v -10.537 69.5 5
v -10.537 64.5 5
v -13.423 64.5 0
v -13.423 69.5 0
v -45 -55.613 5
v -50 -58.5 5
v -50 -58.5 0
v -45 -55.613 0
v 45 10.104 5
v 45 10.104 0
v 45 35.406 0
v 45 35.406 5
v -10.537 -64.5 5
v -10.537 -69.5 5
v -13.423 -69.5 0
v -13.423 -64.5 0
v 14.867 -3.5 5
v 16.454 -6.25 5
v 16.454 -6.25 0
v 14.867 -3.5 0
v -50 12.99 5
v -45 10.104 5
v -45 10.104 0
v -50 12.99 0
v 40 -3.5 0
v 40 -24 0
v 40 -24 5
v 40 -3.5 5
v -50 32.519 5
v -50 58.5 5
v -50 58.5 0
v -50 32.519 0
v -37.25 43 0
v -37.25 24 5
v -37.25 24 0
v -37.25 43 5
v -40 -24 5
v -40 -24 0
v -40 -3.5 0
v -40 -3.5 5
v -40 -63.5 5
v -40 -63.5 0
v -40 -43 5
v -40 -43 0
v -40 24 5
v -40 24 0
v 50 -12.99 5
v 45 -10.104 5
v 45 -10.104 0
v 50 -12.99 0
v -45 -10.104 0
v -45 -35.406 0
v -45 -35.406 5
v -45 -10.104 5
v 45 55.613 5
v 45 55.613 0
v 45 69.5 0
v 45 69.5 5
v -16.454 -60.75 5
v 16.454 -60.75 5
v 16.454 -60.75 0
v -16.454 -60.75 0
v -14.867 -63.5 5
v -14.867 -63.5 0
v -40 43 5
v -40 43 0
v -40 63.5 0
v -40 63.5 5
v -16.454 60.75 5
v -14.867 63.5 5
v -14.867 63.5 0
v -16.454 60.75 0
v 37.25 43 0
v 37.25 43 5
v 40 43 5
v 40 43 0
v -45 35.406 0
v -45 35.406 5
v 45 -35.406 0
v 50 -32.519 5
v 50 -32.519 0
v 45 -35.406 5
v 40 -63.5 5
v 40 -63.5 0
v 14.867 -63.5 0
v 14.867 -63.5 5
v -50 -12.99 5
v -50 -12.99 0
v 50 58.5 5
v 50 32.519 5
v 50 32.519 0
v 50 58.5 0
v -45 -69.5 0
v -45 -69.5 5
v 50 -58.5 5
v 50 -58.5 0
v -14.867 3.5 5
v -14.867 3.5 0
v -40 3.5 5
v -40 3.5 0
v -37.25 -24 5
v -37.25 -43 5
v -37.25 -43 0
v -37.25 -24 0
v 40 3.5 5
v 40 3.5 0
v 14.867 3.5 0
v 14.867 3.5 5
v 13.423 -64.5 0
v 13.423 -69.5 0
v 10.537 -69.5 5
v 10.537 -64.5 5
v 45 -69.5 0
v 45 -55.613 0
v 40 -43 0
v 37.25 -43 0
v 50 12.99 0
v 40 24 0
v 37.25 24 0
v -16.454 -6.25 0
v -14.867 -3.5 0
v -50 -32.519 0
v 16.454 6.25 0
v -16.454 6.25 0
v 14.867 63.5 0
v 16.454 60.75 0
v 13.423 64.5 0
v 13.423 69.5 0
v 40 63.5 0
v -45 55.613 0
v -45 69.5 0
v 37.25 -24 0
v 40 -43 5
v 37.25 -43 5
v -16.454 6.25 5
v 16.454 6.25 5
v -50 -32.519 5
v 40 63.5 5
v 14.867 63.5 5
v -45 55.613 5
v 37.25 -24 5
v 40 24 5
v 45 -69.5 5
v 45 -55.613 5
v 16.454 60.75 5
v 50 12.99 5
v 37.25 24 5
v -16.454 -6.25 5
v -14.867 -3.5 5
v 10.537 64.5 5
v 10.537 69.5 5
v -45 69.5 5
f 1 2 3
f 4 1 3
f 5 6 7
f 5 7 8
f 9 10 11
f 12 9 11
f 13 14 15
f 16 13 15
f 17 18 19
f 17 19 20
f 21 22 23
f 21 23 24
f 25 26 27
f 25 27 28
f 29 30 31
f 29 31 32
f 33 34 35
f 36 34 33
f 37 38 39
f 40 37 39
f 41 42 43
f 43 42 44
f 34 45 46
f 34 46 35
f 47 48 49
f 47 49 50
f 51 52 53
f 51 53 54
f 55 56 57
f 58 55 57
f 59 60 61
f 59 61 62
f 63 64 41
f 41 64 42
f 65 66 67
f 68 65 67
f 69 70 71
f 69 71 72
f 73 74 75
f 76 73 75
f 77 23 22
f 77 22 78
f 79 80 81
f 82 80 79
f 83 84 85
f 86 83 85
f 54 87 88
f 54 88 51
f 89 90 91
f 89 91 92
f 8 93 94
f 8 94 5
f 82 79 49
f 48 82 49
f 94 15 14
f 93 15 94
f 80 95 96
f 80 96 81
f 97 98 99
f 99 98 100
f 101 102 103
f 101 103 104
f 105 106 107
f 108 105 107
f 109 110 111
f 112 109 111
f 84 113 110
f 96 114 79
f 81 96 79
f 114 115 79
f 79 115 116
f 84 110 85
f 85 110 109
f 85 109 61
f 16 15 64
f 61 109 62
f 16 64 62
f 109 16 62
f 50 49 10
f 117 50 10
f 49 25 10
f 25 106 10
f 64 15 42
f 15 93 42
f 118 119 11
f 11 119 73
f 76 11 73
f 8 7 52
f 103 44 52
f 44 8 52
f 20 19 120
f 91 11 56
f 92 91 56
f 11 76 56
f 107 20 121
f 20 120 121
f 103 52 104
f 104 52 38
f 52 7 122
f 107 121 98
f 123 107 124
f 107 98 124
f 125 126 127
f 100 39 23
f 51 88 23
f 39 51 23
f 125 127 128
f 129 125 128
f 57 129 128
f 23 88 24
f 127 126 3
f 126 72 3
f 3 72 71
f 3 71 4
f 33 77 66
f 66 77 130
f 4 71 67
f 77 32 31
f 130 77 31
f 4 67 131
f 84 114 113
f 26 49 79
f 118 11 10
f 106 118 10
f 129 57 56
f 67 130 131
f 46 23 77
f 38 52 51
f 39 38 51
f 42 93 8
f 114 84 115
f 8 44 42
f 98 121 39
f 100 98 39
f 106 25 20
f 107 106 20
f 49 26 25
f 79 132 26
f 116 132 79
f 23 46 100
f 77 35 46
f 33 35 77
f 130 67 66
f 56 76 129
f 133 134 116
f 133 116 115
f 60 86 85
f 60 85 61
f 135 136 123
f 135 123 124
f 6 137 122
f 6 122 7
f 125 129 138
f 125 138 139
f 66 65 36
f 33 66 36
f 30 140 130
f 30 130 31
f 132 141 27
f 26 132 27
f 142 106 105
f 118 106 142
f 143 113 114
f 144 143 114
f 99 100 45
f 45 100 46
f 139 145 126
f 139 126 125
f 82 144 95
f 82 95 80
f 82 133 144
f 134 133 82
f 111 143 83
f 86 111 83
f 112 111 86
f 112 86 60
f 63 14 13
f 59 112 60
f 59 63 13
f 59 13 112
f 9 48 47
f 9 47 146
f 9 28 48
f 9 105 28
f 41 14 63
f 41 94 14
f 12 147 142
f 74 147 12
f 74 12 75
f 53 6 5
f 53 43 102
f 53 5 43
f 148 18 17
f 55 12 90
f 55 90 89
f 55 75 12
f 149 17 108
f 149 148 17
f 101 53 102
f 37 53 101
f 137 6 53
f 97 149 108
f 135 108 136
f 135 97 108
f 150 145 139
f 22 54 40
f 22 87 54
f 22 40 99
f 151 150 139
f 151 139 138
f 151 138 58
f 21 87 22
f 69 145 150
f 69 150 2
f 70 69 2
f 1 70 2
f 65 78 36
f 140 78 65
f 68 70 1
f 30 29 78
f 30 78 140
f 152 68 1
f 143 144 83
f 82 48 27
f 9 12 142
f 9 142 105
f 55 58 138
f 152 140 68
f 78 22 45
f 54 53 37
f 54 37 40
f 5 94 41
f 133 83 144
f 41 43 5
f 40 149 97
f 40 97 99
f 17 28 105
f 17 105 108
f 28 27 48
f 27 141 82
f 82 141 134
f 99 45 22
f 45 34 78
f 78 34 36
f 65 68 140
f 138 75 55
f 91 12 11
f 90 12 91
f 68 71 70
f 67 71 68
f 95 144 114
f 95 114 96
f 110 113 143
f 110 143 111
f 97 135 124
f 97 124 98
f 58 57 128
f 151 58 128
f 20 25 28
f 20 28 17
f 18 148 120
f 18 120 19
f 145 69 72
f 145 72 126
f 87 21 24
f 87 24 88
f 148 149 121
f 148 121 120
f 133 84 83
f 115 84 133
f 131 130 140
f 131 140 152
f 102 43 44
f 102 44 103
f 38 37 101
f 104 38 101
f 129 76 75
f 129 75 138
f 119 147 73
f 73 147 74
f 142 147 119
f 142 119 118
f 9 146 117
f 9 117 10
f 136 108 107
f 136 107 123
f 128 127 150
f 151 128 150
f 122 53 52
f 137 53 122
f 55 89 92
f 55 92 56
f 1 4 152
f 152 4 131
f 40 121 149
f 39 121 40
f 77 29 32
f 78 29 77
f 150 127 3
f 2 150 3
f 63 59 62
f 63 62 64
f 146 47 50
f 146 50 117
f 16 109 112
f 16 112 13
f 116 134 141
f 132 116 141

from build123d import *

# Parameters (mm, degrees)
SKETCH2_W           = 139
SKETCH2_H           = 90
SKETCH2_W_2         = 60
SKETCH2_H_2         = 80
BOSS_EXTRUDE1_DEPTH = 5
CUT_EXTRUDE5_DEPTH  = 5
CUT_EXTRUDE6_START  = 134
CUT_EXTRUDE6_DEPTH  = 5
SKETCH12_W          = 2.75
SKETCH12_H          = 19
BOSS_EXTRUDE2_DEPTH = 5


with BuildPart() as part:
    # Sketch2 → Boss-Extrude1 (new body)
    with BuildSketch(Plane(origin=(0, 0, 0), x_dir=(0, 1, 0), z_dir=(0, 0, 1))):
        Rectangle(SKETCH2_W, SKETCH2_H)
        with Locations((33.5, 0)):
            Rectangle(SKETCH2_W_2, SKETCH2_H_2, mode=Mode.SUBTRACT)
        with Locations((-33.5, 0)):
            Rectangle(SKETCH2_W_2, SKETCH2_H_2, mode=Mode.SUBTRACT)
    extrude(amount=BOSS_EXTRUDE1_DEPTH)

    # Sketch13 → Cut-Extrude5 (cut)
    with BuildSketch(Plane(origin=(0, -69.5, -60), x_dir=(1, 0, 0), z_dir=(0, 1, 0))):
        Polygon((-13.423393759, -60), (13.423393759, -60), (0, -83.25), align=None)
    extrude(amount=CUT_EXTRUDE5_DEPTH, mode=Mode.SUBTRACT)

    # Sketch13<3> → Cut-Extrude6 (cut)
    with BuildSketch(Plane(origin=(0, -69.5, -60), x_dir=(1, 0, 0), z_dir=(0, 1, 0)).offset(CUT_EXTRUDE6_START)):
        Polygon((-13.423393759, -60), (13.423393759, -60), (0, -83.25), align=None)
    extrude(amount=CUT_EXTRUDE6_DEPTH, mode=Mode.SUBTRACT)

    # Sketch12 → Boss-Extrude2 (add)
    with BuildSketch(Plane.XY.offset(5)):
        Polygon((-50, 32.519237886), (-45, 35.405989232), (-45, 55.613248654), (-50, 58.5), align=None)
        Polygon((-45, -10.103629711), (-45, 10.103629711), (-50, 12.990381057), (-50, -12.990381057), align=None)
        with Locations((-38.625, 33.5)):
            Rectangle(SKETCH12_W, SKETCH12_H)
        Polygon((-45, -55.613248654), (-45, -35.405989232), (-50, -32.519237886), (-50, -58.5), align=None)
        Polygon((-16.454482672, 6.25), (-14.866769432, 3.5), (14.866769432, 3.5), (16.454482672, 6.25), align=None)
        with Locations((-38.625, -33.5)):
            Rectangle(SKETCH12_W, SKETCH12_H)
        Polygon((14.866769432, 63.5), (-14.866769432, 63.5), (-16.454482672, 60.75), (16.454482672, 60.75), align=None)
        Polygon((-14.866769432, -3.5), (-16.454482672, -6.25), (16.454482672, -6.25), (14.866769432, -3.5), align=None)
        Polygon((-16.454482672, -60.75), (-14.866769432, -63.5), (14.866769432, -63.5), (16.454482672, -60.75), align=None)
        Polygon((50, 58.5), (45, 55.613248654), (45, 35.405989232), (50, 32.519237886), align=None)
        with Locations((38.625, 33.5)):
            Rectangle(SKETCH12_W, SKETCH12_H)
        Polygon((45, -35.405989232), (45, -55.613248654), (50, -58.5), (50, -32.519237886), align=None)
        with Locations((38.625, -33.5)):
            Rectangle(SKETCH12_W, SKETCH12_H)
        Polygon((45, 10.103629711), (45, -10.103629711), (50, -12.990381057), (50, 12.990381057), align=None)
    extrude(amount=-BOSS_EXTRUDE2_DEPTH)


solid = part.part
